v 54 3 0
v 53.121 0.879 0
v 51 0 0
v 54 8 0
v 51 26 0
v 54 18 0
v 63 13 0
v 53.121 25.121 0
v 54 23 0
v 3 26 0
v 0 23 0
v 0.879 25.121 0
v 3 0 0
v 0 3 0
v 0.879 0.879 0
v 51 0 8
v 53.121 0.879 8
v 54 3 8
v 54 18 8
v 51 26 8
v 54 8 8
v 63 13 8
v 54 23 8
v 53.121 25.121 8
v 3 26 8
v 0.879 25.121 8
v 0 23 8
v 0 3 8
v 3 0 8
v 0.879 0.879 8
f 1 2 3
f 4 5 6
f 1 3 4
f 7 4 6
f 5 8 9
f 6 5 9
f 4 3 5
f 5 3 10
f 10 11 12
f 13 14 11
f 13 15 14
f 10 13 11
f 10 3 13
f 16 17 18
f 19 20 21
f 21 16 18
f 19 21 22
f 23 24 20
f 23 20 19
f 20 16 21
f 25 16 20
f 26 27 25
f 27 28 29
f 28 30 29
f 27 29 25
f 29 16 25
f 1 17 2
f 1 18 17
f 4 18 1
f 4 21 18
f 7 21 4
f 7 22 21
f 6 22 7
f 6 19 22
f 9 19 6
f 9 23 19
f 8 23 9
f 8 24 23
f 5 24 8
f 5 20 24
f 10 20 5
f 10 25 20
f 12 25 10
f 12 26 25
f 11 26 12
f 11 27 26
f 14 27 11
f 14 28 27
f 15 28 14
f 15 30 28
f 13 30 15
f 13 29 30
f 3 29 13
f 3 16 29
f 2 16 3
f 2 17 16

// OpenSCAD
$fn = 32;

// ----------------------------------------------------------------------
// Ratchet pawl: 54 x 26 mm body, beak 9 mm с правого торца
// ----------------------------------------------------------------------

// --- parameters (mm) ---
profile_height = 8;       // extrusion height
profile_points = 15;      // points of the closed outline

profile = [[0, 3], [0.879, 0.879], [3, 0], [51, 0], [53.121, 0.879], [54, 3], [54, 8], [63, 13], [54, 18], [54, 23], [53.121, 25.121], [51, 26], [3, 26], [0.879, 25.121], [0, 23]];  // single closed polygon, 15 points, counter clockwise

// --- the one profile operation ---
linear_extrude(height = profile_height) polygon(points = profile);
